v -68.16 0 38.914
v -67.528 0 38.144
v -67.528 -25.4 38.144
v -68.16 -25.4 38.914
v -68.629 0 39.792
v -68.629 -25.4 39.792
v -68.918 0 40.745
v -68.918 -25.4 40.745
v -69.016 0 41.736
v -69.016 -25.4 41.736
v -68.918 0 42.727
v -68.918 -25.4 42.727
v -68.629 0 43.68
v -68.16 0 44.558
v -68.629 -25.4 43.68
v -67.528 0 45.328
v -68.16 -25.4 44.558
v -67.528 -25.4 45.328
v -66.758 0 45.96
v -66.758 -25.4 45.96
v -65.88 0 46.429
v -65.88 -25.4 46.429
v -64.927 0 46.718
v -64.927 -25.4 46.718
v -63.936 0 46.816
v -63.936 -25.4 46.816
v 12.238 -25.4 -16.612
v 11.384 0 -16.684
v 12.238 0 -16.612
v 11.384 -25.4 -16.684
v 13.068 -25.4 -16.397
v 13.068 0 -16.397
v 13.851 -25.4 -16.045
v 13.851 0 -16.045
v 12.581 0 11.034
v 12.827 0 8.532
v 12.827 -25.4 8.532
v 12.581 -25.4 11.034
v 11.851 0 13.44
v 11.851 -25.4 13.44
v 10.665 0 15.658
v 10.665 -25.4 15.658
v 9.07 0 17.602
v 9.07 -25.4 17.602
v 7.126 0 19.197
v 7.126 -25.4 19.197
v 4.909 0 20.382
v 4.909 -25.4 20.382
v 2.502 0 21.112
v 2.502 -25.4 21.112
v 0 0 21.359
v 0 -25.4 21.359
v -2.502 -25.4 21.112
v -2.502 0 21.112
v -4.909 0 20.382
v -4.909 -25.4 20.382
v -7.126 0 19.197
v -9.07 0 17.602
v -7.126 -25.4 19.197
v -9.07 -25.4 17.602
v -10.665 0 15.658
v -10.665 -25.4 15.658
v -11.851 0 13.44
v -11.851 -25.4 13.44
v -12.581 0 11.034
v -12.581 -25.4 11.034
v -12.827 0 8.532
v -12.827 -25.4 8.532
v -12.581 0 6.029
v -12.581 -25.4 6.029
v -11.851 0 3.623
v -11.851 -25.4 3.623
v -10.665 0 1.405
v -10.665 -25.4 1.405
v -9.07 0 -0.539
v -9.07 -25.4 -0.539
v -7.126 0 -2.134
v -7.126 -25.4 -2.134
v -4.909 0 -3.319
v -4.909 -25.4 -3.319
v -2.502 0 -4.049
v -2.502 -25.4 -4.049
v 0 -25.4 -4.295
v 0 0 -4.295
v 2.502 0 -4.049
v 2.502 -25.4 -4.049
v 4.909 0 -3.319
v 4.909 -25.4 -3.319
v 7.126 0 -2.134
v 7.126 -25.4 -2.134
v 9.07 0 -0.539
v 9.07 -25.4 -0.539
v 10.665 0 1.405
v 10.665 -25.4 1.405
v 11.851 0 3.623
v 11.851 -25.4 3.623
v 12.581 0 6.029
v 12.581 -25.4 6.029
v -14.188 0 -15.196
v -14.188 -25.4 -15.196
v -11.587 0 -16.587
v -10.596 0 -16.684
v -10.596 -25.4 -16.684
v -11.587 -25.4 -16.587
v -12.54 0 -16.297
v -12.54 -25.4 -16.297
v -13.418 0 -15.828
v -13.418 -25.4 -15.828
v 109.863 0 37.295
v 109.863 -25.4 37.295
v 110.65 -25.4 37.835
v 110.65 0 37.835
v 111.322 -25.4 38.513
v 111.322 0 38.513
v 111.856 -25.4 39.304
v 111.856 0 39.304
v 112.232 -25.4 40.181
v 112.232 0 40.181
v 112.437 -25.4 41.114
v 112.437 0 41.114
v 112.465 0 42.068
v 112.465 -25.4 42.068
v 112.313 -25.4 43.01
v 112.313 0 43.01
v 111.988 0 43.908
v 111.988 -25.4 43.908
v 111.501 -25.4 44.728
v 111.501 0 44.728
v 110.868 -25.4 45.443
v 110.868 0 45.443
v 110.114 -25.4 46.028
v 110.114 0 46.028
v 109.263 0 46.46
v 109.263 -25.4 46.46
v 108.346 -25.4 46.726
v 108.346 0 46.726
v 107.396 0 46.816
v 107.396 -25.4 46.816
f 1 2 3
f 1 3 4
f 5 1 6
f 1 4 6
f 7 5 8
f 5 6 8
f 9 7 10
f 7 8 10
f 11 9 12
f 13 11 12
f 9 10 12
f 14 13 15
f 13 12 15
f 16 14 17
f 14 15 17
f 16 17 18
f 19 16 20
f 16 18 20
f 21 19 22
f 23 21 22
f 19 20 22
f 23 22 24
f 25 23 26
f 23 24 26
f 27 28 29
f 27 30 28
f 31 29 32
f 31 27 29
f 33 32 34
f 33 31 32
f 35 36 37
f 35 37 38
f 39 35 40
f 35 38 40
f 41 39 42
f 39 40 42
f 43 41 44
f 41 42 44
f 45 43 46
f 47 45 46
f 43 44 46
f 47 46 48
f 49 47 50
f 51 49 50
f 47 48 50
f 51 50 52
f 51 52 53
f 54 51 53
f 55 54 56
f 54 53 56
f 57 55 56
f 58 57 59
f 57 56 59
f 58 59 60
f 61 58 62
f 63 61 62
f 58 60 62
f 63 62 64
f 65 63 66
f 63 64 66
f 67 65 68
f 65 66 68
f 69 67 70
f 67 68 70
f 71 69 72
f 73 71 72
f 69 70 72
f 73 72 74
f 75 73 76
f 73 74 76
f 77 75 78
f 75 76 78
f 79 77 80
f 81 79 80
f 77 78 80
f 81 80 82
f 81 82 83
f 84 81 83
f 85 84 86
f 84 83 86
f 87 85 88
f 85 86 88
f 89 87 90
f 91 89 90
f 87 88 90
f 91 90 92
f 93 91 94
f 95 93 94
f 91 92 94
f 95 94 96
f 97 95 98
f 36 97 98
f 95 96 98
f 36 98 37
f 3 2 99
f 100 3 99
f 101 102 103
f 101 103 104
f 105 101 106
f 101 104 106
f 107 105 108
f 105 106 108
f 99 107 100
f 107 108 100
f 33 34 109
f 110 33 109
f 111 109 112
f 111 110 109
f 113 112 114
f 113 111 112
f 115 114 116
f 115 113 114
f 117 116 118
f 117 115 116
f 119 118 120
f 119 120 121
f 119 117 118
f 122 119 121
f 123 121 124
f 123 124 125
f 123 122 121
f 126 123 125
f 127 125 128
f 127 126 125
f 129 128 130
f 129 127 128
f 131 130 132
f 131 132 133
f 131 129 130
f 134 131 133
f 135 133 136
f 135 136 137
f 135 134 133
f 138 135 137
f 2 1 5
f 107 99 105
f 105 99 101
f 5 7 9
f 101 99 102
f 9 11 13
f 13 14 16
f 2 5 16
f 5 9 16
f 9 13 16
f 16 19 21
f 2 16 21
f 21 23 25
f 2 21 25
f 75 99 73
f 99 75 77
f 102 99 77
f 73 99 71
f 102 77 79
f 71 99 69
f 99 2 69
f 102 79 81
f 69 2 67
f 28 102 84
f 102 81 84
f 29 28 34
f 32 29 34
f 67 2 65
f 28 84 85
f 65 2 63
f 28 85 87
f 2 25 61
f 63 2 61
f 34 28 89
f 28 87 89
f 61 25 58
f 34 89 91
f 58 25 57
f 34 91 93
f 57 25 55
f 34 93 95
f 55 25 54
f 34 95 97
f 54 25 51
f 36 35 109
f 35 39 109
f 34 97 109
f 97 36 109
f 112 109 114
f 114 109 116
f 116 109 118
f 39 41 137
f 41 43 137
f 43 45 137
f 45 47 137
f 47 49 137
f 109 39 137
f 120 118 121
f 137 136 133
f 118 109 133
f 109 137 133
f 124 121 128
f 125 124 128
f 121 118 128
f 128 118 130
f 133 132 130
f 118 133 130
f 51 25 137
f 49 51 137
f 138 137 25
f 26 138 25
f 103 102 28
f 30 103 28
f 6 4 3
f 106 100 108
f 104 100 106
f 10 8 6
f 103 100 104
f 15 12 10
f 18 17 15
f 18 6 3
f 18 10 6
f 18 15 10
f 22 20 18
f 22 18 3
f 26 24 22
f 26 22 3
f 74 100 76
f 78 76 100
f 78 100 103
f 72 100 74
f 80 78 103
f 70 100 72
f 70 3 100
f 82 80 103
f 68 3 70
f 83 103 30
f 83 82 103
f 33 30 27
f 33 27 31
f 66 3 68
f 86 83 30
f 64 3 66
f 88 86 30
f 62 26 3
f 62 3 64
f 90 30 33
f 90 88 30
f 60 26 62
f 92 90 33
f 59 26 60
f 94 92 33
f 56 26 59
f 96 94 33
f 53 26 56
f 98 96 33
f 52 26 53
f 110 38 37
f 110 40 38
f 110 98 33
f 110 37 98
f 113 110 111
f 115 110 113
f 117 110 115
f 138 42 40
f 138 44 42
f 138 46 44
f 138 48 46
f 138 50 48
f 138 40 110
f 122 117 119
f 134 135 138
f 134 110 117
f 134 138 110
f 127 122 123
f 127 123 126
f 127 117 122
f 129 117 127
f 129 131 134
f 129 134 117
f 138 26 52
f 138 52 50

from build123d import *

# Parameters (mm, degrees)
F2_DEPTH = 25.4
F3_DEPTH = 25.4
F4_R     = 5.08
F5_R     = 12.827
F5_R_2   = 12.7
F6_DEPTH = 25.4


with BuildPart() as f2:
    # F0 (on Front) → F2 (new body)
    with BuildSketch(Plane.XZ):
        Polygon((-12.7, -16.6841130704), (0, -16.6841130704), (0, 46.8158869296), (-76.2, 46.8158869296), align=None)
        Polygon((0, 46.8158869296), (0, -16.6841130704), (12.7, -16.6841130704), (127, 46.8158869296), align=None)
    extrude(amount=F2_DEPTH)

    # F1 (on face) → F3 (cut)
    with BuildSketch(Plane.XZ):
        with BuildLine():
            ThreePointArc((0, 21.231531626), (-12.7, 8.531531626), (0, -4.168468374))
            Line((0, -4.168468374), (0, 8.531531626))
            Line((0, 8.531531626), (0, 21.231531626))
        make_face()
        with BuildLine():
            Line((0, 8.531531626), (0, -4.168468374))
            ThreePointArc((0, -4.168468374), (8.9802561211, -0.4487244951), (12.7, 8.531531626))
            ThreePointArc((12.7, 8.531531626), (8.9802561211, 17.5117877471), (0, 21.231531626))
            Line((0, 21.231531626), (0, 8.531531626))
        make_face()
    extrude(amount=F3_DEPTH, mode=Mode.SUBTRACT)

    # F4
    f4_edges = [f2.edges().sort_by_distance(p)[0] for p in [
        (-12.7, -12.7, -16.684113),
        (12.7, -12.7, -16.684113),
        (127, -12.7, 46.815887),
        (-76.2, -12.7, 46.815887),
    ]]
    fillet(f4_edges, radius=F4_R)

    # F5 (on face) → F6 (cut)
    with BuildSketch(Plane.XZ.offset(25.4)):
        with Locations((0, 8.531531626)):
            Circle(F5_R)
        with Locations((0, 8.531531626)):
            Circle(F5_R_2, mode=Mode.SUBTRACT)
    extrude(amount=-F6_DEPTH, mode=Mode.SUBTRACT)


solid = f2.part
